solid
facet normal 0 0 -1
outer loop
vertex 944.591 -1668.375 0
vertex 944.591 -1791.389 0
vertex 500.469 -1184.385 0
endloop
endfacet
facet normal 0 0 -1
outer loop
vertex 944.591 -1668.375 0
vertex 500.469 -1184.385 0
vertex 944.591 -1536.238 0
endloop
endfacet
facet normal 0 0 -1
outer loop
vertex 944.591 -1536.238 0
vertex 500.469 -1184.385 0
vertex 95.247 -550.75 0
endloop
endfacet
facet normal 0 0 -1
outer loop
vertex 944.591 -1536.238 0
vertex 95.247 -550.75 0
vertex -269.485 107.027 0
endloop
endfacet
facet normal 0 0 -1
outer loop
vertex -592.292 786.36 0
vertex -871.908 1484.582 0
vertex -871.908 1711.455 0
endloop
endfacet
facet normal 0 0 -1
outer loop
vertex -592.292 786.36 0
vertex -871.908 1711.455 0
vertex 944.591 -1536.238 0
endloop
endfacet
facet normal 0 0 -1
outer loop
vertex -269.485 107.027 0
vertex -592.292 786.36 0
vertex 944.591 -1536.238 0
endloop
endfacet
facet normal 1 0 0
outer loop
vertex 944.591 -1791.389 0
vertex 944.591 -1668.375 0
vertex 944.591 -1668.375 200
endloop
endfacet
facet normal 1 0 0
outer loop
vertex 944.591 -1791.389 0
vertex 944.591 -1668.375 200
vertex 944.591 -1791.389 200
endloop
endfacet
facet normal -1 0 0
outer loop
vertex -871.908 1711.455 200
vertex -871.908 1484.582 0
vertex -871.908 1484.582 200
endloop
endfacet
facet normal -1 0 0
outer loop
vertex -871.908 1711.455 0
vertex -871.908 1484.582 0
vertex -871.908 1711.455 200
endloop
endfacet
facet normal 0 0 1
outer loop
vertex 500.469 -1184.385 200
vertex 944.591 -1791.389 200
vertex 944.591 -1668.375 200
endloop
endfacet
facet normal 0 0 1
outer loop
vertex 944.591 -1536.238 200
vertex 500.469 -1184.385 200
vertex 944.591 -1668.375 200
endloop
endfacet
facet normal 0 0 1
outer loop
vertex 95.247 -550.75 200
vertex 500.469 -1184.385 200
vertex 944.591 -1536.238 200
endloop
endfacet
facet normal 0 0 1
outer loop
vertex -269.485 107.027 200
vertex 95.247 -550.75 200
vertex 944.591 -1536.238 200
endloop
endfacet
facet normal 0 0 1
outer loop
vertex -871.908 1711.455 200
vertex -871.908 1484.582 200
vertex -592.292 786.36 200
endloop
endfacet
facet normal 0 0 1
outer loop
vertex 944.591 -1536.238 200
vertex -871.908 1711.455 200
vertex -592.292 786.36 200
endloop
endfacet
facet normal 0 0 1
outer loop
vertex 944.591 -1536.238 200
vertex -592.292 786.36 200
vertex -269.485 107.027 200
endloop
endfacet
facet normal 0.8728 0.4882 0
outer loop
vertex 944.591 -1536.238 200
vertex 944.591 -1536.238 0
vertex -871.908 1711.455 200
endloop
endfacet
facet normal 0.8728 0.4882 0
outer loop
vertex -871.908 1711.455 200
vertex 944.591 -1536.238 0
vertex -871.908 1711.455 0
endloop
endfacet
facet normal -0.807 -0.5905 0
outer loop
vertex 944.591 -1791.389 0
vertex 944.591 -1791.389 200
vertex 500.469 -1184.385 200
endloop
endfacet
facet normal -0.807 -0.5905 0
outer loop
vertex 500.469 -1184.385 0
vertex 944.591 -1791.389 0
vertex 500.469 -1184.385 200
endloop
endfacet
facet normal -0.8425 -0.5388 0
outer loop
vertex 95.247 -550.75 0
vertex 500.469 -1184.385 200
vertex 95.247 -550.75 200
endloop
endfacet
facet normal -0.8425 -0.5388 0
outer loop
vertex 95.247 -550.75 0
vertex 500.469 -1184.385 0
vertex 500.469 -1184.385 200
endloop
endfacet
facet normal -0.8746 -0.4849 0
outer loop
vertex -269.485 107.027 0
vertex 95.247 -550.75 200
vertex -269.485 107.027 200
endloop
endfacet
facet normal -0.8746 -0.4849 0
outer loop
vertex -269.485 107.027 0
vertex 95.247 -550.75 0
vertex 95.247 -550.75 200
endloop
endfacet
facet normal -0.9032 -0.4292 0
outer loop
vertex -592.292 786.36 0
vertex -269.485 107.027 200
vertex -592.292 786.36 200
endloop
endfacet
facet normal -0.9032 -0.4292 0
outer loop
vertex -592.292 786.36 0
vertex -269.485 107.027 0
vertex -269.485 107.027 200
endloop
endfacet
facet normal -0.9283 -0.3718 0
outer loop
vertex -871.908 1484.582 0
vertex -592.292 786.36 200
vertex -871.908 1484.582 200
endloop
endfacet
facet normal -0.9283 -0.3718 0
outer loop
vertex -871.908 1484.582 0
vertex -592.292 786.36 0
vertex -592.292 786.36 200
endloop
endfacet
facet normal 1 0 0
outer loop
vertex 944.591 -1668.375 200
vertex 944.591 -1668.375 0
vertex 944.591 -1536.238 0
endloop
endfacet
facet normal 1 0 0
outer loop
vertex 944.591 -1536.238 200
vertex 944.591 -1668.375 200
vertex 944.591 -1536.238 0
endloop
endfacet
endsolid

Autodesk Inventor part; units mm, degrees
ref_plane "YZ Plane" through (0, 0, 0) normal (1, 0, 0) x (0, 1, 0)
ref_plane "XZ Plane" through (0, 0, 0) normal (0, 1, 0) x (-1, 0, 0)
ref_plane "XY Plane" through (0, 0, 0) normal (0, 0, 1) x (1, 0, 0)
sketch "Sketch1" plane through (0, 0, 0) normal (0, 0, 1) x (1, 0, 0)
  line L0 (944.5906, -1536.2377) -> (-871.9078, 1711.4549)
  line L1 (944.5906, -1668.3747) -> (944.5906, -1536.2377)
  line L2 (944.5906, -1536.2377) -> (944.5906, -1791.3892)
  line L3 (-871.9078, 1484.5818) -> (-871.9078, 1711.4549)
  arc A0 (-871.9078, 1484.5818) -> (944.5906, -1791.3892) centre (10402.3503, 5594.4609) ccw
  point P0 (0, 0)
  point P1 (963.6736, -1791.3892)
  point P2 (-975.9036, 1415.1228)
  point P3 (-975.579, 1678.3612)
  dimension "d3" = 12000
extrude "Extrusion2" add sketch "Sketch1" along normal blind 200
properties part number "side_curve_beam_04" material "Wood (Maple)"
